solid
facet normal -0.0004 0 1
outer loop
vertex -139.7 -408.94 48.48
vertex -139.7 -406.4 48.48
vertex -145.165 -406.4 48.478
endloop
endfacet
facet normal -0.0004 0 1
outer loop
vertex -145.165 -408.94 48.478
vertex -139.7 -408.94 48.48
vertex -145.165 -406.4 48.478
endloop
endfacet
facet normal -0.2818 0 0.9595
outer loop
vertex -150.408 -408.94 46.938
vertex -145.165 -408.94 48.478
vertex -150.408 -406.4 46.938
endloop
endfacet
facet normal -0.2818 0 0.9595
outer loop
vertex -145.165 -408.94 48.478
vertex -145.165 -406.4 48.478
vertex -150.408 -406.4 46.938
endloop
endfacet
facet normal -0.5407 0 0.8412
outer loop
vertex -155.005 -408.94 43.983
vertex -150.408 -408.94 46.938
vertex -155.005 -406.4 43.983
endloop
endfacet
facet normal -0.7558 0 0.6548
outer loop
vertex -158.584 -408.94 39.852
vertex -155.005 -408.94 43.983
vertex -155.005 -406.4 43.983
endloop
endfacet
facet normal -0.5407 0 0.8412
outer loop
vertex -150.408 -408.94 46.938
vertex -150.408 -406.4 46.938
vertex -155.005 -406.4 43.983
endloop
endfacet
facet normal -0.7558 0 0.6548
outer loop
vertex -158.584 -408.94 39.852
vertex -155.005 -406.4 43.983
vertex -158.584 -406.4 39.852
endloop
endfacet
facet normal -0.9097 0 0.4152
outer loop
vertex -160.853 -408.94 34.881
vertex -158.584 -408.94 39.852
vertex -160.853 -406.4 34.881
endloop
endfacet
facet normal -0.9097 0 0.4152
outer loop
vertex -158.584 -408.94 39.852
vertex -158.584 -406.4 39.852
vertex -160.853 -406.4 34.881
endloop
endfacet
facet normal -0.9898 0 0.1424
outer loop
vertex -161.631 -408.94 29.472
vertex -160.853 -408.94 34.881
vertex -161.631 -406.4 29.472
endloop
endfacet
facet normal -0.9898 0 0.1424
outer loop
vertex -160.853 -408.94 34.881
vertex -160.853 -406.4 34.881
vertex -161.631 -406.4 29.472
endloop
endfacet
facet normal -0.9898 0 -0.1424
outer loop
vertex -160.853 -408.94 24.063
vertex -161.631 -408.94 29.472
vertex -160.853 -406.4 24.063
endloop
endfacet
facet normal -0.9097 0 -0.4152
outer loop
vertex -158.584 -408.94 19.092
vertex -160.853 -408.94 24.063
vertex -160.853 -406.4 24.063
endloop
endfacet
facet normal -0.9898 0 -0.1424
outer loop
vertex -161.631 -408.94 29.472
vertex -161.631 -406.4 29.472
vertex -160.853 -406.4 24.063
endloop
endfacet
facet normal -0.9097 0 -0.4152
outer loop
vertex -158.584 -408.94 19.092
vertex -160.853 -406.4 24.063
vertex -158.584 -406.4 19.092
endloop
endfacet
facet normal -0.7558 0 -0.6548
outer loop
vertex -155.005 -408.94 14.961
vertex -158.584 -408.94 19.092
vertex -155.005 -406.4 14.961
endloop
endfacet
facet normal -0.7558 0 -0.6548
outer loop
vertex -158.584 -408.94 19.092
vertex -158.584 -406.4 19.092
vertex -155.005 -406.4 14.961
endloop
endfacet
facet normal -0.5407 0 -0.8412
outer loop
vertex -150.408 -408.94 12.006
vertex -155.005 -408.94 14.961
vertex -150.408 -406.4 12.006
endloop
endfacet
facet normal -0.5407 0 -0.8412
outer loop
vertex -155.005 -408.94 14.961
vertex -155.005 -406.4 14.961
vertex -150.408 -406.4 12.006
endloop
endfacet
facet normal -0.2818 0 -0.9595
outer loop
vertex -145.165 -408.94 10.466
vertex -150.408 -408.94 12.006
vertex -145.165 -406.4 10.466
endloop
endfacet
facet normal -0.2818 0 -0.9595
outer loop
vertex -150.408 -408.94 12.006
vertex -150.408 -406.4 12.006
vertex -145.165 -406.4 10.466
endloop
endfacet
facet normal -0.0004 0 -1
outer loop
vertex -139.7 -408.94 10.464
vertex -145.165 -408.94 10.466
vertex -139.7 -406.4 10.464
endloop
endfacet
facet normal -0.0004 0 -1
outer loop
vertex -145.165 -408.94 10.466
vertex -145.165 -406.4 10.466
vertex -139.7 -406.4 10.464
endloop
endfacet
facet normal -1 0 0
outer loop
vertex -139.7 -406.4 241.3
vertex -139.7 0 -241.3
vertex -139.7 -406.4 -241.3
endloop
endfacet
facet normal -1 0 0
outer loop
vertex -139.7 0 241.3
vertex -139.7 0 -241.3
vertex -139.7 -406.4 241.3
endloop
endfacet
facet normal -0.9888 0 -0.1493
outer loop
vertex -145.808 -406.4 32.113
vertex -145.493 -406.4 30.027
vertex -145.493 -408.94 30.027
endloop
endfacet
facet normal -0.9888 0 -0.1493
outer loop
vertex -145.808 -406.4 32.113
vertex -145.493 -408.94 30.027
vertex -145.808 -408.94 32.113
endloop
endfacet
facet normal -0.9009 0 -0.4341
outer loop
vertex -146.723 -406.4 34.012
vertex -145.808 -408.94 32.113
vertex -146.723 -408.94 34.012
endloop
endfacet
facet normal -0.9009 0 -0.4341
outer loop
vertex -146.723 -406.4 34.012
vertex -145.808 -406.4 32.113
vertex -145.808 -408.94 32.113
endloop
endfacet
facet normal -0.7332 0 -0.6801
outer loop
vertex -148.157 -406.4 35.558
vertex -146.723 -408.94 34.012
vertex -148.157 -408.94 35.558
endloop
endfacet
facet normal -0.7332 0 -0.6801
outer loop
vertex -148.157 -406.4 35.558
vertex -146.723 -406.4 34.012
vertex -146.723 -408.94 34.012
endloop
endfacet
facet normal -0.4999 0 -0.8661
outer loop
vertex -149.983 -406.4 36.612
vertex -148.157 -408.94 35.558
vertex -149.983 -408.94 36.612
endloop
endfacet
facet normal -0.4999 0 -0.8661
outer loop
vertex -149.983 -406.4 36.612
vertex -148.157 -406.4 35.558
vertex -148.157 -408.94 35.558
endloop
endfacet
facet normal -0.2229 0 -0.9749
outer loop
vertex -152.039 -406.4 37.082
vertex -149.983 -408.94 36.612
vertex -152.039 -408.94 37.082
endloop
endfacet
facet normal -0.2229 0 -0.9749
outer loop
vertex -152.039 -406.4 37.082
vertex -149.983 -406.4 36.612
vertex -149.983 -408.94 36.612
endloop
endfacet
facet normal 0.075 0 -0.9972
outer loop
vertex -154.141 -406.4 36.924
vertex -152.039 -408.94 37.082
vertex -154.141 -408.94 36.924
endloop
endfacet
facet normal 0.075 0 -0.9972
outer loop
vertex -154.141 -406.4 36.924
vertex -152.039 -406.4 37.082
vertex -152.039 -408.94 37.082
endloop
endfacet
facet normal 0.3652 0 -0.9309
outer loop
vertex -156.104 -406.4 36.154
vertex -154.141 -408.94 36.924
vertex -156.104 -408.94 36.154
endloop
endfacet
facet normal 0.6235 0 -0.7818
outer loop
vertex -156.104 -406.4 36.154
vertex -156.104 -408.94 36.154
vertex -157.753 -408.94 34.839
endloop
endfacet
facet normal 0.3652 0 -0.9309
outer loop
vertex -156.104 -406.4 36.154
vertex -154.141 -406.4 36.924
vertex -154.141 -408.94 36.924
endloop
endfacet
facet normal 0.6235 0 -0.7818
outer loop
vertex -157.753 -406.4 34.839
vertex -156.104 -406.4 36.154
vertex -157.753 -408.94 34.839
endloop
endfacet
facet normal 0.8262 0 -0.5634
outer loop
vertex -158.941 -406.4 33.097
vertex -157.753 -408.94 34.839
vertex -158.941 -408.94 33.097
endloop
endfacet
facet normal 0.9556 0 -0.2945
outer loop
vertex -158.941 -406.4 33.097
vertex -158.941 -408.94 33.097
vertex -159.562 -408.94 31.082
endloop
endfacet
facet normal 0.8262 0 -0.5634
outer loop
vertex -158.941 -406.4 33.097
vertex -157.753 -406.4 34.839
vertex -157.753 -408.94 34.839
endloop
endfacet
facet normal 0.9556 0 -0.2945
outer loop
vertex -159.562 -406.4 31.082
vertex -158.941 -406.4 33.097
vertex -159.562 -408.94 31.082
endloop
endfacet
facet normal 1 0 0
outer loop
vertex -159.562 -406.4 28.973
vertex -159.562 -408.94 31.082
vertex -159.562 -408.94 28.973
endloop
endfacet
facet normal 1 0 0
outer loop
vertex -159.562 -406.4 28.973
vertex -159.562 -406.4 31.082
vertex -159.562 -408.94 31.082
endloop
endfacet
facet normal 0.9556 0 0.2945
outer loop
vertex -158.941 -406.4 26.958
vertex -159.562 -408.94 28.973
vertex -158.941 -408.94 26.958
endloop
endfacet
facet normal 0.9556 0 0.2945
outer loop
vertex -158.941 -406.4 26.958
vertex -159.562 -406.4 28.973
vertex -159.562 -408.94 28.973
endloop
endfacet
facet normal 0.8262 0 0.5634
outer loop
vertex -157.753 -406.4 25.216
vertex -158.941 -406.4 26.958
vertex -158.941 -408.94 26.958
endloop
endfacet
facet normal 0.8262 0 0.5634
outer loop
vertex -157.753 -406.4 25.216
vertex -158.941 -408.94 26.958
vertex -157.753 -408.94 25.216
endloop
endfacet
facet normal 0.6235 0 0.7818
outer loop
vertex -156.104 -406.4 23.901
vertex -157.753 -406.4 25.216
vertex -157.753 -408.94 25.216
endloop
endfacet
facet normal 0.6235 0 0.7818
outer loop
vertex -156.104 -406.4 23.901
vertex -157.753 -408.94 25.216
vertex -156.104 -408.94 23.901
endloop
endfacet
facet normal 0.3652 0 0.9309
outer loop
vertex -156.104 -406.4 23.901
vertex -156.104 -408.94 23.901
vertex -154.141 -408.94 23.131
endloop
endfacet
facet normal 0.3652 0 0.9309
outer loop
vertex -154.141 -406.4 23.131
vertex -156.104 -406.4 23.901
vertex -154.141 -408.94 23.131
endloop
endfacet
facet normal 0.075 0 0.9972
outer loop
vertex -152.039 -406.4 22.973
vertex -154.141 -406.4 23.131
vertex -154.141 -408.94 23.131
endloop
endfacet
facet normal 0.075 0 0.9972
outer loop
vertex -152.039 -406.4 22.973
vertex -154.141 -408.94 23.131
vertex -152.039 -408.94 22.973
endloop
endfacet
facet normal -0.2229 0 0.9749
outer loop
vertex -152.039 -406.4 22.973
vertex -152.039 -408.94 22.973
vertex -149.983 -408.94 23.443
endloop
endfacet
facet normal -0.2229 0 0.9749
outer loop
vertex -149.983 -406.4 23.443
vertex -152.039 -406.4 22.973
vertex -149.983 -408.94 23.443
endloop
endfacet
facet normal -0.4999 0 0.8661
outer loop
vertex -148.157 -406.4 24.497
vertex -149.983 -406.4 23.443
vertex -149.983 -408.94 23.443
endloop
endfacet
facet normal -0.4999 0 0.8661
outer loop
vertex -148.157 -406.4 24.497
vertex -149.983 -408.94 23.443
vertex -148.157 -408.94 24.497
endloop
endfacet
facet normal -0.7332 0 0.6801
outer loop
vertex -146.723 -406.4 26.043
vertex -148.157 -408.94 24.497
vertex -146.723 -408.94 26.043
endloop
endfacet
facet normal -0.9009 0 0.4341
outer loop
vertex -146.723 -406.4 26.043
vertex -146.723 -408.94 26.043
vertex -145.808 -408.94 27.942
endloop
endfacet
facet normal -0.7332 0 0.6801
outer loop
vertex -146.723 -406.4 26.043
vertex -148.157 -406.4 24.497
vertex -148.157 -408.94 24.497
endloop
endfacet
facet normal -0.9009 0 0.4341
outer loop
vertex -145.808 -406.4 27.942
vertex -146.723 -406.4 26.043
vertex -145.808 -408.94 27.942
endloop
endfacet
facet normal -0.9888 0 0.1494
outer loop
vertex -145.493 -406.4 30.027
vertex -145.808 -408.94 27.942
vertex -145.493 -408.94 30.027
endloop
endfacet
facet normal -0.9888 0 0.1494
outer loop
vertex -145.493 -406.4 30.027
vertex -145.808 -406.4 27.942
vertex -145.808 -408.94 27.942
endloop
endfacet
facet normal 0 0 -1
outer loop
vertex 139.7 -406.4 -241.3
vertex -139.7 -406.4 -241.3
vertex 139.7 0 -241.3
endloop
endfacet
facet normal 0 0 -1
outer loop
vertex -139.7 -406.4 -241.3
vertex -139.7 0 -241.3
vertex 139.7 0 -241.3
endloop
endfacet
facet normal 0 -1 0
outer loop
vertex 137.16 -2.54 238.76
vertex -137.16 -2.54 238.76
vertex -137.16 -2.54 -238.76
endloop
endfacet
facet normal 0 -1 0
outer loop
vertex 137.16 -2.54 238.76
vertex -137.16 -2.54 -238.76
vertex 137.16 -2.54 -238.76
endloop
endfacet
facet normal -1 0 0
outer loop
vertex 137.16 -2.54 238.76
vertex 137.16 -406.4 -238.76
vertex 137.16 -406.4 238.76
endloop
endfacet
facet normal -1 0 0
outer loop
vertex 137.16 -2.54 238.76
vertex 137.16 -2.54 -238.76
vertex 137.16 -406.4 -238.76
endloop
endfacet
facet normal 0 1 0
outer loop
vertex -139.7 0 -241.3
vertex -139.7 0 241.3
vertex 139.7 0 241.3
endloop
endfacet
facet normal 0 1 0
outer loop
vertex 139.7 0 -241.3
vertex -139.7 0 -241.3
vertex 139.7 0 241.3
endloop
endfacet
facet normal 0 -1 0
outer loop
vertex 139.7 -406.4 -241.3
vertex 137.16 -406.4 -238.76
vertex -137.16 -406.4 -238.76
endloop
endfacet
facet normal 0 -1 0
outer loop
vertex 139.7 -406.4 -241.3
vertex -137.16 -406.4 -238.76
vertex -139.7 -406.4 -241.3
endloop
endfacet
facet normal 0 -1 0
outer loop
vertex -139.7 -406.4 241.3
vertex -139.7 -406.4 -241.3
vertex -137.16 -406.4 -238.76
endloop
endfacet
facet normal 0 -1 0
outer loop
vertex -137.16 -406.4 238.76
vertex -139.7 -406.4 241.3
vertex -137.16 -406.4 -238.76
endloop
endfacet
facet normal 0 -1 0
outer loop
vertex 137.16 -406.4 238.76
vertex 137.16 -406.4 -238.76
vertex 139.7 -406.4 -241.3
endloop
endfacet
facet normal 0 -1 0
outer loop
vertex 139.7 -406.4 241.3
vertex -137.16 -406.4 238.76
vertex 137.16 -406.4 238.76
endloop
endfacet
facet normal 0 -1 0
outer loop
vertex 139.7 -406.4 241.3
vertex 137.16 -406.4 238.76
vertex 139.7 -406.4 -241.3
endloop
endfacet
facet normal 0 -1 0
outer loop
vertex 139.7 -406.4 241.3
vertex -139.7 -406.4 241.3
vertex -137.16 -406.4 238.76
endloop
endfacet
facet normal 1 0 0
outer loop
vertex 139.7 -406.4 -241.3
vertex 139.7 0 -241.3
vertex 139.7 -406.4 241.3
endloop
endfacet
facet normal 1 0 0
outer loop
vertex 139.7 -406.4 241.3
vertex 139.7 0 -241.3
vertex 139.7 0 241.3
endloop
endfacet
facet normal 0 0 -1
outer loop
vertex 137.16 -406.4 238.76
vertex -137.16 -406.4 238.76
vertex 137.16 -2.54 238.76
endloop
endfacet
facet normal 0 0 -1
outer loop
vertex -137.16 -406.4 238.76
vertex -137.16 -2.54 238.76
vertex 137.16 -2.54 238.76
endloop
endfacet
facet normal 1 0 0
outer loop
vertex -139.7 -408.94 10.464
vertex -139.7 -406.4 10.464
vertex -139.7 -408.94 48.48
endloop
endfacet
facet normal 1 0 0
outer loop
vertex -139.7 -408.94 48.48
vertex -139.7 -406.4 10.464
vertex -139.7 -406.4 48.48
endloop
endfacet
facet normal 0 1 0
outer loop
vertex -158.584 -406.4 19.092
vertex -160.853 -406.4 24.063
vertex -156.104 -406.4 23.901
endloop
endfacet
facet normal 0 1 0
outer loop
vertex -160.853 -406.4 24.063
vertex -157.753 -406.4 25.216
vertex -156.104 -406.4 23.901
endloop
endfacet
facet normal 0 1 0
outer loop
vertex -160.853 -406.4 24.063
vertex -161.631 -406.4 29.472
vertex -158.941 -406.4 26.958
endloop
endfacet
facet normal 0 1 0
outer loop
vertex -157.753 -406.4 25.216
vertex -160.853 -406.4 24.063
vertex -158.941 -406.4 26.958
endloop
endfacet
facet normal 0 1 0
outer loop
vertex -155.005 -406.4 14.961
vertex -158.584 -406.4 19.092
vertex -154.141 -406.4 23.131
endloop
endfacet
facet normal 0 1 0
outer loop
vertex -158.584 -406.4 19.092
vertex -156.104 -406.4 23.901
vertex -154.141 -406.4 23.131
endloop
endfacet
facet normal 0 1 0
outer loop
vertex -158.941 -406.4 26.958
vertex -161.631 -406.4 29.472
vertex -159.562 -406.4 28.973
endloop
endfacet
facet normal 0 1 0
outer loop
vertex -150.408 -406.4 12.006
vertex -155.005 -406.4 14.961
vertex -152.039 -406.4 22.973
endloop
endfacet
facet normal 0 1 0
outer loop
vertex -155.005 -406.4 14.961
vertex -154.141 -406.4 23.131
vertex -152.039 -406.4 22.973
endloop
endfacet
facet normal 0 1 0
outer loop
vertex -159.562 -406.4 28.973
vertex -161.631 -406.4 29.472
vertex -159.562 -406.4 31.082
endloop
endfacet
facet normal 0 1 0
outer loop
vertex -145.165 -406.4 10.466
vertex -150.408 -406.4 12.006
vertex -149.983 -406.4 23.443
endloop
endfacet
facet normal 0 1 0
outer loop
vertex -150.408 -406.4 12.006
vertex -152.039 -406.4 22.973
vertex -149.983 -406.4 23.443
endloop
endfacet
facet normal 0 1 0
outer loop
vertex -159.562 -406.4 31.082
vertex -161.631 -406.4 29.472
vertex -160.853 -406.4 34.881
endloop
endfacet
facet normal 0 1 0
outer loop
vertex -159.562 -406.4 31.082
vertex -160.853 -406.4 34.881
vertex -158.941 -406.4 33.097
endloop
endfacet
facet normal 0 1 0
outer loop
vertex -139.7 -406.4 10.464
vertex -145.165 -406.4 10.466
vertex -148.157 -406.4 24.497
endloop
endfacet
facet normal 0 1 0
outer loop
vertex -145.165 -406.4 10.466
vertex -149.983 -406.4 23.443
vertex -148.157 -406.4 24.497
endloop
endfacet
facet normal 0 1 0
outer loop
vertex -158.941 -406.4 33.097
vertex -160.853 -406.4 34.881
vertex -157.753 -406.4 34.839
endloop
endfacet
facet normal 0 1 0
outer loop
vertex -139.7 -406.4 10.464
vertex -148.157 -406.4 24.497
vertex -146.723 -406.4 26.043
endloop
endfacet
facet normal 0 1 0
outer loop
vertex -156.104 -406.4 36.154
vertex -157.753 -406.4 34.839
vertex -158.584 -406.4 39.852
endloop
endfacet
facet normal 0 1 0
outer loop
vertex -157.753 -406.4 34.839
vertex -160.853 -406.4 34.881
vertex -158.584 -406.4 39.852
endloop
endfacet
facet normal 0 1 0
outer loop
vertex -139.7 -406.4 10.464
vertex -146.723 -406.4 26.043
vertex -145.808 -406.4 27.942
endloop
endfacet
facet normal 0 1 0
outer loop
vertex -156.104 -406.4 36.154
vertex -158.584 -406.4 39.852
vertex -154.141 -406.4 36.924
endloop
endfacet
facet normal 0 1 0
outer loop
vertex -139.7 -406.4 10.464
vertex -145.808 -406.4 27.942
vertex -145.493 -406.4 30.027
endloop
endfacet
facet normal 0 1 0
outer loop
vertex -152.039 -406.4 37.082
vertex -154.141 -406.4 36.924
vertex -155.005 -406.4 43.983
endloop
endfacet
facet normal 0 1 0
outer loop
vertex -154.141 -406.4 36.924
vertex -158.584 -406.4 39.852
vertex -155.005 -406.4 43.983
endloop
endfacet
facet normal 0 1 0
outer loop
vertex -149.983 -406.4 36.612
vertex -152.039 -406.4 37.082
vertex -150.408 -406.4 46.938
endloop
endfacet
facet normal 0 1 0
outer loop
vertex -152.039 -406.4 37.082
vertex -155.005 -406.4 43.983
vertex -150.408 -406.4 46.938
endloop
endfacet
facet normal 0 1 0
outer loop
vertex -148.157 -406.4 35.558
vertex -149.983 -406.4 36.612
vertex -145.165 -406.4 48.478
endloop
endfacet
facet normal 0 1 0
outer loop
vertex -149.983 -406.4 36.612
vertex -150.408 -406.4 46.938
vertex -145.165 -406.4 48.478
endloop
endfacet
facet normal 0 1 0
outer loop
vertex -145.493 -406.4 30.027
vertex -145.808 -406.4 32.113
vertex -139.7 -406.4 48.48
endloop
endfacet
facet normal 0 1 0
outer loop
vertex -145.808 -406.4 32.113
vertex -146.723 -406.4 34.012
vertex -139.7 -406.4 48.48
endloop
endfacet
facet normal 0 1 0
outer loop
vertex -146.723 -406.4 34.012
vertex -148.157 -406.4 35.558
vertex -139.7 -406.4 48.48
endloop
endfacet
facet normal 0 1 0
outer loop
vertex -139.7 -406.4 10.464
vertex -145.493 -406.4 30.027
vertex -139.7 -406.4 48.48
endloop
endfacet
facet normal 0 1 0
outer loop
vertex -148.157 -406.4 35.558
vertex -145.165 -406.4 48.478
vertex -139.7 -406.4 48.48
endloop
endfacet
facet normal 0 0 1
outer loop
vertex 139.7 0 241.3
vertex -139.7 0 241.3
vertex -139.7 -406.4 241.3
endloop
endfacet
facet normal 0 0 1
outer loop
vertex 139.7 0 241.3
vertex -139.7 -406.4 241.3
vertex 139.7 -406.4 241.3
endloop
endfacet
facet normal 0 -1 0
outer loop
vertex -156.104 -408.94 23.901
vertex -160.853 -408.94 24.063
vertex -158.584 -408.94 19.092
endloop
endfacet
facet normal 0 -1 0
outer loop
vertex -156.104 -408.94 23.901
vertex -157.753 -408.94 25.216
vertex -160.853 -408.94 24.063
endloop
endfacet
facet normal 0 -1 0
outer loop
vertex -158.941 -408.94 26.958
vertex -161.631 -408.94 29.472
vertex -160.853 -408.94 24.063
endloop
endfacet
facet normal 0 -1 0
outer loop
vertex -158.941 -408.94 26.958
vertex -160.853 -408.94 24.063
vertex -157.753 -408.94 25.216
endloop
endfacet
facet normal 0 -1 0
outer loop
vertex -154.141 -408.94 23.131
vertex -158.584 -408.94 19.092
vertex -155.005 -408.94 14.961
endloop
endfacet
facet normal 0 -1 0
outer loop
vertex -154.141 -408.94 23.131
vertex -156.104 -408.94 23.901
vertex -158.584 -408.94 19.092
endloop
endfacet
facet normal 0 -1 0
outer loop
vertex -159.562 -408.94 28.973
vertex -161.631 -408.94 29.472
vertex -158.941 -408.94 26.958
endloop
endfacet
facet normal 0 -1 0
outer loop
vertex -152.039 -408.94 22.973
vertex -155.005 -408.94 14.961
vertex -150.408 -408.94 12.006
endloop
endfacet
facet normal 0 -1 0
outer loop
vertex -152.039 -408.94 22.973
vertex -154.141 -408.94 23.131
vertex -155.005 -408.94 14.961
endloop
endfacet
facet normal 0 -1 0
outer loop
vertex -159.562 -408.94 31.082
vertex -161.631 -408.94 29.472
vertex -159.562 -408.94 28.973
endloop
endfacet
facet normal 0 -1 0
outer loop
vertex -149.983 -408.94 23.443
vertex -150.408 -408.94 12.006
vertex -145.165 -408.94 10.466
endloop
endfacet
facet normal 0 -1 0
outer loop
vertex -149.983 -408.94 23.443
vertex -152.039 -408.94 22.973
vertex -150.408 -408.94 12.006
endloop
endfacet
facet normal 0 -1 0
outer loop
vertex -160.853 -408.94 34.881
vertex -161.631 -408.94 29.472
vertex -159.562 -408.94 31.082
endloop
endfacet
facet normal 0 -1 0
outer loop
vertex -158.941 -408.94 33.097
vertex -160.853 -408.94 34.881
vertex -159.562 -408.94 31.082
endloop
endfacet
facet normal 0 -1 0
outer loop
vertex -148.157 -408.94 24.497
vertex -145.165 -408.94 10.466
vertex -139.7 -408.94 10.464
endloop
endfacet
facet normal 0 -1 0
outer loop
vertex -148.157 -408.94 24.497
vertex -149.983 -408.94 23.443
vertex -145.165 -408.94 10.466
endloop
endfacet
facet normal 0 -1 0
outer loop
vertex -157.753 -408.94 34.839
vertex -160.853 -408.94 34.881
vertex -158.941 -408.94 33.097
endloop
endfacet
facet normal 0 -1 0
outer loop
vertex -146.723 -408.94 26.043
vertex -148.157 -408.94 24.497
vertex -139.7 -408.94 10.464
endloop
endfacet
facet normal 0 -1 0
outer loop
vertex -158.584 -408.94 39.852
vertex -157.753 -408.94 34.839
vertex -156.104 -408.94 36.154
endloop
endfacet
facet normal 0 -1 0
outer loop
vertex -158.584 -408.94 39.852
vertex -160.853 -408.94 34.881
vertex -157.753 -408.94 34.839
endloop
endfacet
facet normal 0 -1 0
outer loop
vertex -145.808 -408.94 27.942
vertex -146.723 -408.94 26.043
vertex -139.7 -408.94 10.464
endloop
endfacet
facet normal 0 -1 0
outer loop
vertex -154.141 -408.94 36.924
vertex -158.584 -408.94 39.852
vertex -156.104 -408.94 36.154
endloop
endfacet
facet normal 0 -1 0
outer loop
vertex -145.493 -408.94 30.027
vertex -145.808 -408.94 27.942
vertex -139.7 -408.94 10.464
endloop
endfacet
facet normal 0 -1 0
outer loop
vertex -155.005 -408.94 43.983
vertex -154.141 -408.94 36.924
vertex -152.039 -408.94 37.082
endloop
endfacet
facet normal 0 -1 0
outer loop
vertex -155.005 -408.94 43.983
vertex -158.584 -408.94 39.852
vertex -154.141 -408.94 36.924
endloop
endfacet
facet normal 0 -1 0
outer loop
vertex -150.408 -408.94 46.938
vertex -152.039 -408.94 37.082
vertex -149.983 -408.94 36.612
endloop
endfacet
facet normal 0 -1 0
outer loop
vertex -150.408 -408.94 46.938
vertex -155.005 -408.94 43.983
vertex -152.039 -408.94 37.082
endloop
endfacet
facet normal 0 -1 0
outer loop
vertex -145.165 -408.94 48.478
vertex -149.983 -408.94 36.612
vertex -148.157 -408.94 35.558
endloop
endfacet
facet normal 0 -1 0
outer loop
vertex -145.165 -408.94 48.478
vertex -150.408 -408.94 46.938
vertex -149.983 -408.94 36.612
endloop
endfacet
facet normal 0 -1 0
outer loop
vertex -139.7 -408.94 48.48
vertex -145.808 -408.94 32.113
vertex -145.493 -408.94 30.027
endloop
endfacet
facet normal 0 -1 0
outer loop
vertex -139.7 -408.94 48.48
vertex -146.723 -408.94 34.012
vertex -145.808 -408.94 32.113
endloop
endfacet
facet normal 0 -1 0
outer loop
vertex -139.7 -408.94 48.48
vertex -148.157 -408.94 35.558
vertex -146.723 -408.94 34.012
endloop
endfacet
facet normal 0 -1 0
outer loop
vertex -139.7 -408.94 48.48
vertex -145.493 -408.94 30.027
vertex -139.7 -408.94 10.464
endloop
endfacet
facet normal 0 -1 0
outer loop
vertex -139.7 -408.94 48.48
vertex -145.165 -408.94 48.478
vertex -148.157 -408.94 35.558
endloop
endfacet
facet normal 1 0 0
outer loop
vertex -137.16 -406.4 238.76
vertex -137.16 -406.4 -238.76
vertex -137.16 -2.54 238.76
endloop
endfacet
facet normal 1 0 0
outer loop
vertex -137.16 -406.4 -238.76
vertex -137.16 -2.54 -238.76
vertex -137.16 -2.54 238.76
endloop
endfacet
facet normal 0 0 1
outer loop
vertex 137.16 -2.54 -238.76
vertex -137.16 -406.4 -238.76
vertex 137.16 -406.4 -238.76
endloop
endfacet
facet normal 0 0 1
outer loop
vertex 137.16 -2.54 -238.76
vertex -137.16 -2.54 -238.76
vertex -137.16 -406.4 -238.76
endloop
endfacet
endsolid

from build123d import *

# Parameters (mm, degrees)
F0_W     = 279.4
F0_H     = 482.6
F1_DEPTH = 25.4
F2_DEPTH = 381
F3_T     = -2.54
F4_R     = 7.0739
F5_DEPTH = 2.54


with BuildPart() as f1:
    # F0 (on Front) → F1 (new body)
    with BuildSketch(Plane.XZ):
        Rectangle(F0_W, F0_H)
    extrude(amount=F1_DEPTH)

    # F2 (add): a face of the model
    f2_faces = [f1.faces().sort_by_distance(p)[0] for p in [
        (0, -25.4, 0),
    ]]
    extrude(f2_faces, amount=F2_DEPTH)

    # F3
    f3_openings = [f1.faces().sort_by_distance(p)[0] for p in [
        (0, -406.4, 0),
    ]]
    offset(amount=F3_T, openings=f3_openings)


with BuildPart() as f5:
    # F4 (on face) → F5 (new body)
    with BuildSketch(Plane.XZ.offset(406.4)):
        with BuildLine():
            Line((-139.7, 10.4644373059), (-139.7, 48.4795074795))
            ThreePointArc((-139.7, 48.4795074795), (-161.6310948682, 29.4719723927), (-139.7, 10.4644373059))
        make_face()
        with Locations((-152.5672972202, 30.0274454057)):
            Circle(F4_R, mode=Mode.SUBTRACT)
    extrude(amount=F5_DEPTH)


solid = Compound([f1.part, f5.part])
